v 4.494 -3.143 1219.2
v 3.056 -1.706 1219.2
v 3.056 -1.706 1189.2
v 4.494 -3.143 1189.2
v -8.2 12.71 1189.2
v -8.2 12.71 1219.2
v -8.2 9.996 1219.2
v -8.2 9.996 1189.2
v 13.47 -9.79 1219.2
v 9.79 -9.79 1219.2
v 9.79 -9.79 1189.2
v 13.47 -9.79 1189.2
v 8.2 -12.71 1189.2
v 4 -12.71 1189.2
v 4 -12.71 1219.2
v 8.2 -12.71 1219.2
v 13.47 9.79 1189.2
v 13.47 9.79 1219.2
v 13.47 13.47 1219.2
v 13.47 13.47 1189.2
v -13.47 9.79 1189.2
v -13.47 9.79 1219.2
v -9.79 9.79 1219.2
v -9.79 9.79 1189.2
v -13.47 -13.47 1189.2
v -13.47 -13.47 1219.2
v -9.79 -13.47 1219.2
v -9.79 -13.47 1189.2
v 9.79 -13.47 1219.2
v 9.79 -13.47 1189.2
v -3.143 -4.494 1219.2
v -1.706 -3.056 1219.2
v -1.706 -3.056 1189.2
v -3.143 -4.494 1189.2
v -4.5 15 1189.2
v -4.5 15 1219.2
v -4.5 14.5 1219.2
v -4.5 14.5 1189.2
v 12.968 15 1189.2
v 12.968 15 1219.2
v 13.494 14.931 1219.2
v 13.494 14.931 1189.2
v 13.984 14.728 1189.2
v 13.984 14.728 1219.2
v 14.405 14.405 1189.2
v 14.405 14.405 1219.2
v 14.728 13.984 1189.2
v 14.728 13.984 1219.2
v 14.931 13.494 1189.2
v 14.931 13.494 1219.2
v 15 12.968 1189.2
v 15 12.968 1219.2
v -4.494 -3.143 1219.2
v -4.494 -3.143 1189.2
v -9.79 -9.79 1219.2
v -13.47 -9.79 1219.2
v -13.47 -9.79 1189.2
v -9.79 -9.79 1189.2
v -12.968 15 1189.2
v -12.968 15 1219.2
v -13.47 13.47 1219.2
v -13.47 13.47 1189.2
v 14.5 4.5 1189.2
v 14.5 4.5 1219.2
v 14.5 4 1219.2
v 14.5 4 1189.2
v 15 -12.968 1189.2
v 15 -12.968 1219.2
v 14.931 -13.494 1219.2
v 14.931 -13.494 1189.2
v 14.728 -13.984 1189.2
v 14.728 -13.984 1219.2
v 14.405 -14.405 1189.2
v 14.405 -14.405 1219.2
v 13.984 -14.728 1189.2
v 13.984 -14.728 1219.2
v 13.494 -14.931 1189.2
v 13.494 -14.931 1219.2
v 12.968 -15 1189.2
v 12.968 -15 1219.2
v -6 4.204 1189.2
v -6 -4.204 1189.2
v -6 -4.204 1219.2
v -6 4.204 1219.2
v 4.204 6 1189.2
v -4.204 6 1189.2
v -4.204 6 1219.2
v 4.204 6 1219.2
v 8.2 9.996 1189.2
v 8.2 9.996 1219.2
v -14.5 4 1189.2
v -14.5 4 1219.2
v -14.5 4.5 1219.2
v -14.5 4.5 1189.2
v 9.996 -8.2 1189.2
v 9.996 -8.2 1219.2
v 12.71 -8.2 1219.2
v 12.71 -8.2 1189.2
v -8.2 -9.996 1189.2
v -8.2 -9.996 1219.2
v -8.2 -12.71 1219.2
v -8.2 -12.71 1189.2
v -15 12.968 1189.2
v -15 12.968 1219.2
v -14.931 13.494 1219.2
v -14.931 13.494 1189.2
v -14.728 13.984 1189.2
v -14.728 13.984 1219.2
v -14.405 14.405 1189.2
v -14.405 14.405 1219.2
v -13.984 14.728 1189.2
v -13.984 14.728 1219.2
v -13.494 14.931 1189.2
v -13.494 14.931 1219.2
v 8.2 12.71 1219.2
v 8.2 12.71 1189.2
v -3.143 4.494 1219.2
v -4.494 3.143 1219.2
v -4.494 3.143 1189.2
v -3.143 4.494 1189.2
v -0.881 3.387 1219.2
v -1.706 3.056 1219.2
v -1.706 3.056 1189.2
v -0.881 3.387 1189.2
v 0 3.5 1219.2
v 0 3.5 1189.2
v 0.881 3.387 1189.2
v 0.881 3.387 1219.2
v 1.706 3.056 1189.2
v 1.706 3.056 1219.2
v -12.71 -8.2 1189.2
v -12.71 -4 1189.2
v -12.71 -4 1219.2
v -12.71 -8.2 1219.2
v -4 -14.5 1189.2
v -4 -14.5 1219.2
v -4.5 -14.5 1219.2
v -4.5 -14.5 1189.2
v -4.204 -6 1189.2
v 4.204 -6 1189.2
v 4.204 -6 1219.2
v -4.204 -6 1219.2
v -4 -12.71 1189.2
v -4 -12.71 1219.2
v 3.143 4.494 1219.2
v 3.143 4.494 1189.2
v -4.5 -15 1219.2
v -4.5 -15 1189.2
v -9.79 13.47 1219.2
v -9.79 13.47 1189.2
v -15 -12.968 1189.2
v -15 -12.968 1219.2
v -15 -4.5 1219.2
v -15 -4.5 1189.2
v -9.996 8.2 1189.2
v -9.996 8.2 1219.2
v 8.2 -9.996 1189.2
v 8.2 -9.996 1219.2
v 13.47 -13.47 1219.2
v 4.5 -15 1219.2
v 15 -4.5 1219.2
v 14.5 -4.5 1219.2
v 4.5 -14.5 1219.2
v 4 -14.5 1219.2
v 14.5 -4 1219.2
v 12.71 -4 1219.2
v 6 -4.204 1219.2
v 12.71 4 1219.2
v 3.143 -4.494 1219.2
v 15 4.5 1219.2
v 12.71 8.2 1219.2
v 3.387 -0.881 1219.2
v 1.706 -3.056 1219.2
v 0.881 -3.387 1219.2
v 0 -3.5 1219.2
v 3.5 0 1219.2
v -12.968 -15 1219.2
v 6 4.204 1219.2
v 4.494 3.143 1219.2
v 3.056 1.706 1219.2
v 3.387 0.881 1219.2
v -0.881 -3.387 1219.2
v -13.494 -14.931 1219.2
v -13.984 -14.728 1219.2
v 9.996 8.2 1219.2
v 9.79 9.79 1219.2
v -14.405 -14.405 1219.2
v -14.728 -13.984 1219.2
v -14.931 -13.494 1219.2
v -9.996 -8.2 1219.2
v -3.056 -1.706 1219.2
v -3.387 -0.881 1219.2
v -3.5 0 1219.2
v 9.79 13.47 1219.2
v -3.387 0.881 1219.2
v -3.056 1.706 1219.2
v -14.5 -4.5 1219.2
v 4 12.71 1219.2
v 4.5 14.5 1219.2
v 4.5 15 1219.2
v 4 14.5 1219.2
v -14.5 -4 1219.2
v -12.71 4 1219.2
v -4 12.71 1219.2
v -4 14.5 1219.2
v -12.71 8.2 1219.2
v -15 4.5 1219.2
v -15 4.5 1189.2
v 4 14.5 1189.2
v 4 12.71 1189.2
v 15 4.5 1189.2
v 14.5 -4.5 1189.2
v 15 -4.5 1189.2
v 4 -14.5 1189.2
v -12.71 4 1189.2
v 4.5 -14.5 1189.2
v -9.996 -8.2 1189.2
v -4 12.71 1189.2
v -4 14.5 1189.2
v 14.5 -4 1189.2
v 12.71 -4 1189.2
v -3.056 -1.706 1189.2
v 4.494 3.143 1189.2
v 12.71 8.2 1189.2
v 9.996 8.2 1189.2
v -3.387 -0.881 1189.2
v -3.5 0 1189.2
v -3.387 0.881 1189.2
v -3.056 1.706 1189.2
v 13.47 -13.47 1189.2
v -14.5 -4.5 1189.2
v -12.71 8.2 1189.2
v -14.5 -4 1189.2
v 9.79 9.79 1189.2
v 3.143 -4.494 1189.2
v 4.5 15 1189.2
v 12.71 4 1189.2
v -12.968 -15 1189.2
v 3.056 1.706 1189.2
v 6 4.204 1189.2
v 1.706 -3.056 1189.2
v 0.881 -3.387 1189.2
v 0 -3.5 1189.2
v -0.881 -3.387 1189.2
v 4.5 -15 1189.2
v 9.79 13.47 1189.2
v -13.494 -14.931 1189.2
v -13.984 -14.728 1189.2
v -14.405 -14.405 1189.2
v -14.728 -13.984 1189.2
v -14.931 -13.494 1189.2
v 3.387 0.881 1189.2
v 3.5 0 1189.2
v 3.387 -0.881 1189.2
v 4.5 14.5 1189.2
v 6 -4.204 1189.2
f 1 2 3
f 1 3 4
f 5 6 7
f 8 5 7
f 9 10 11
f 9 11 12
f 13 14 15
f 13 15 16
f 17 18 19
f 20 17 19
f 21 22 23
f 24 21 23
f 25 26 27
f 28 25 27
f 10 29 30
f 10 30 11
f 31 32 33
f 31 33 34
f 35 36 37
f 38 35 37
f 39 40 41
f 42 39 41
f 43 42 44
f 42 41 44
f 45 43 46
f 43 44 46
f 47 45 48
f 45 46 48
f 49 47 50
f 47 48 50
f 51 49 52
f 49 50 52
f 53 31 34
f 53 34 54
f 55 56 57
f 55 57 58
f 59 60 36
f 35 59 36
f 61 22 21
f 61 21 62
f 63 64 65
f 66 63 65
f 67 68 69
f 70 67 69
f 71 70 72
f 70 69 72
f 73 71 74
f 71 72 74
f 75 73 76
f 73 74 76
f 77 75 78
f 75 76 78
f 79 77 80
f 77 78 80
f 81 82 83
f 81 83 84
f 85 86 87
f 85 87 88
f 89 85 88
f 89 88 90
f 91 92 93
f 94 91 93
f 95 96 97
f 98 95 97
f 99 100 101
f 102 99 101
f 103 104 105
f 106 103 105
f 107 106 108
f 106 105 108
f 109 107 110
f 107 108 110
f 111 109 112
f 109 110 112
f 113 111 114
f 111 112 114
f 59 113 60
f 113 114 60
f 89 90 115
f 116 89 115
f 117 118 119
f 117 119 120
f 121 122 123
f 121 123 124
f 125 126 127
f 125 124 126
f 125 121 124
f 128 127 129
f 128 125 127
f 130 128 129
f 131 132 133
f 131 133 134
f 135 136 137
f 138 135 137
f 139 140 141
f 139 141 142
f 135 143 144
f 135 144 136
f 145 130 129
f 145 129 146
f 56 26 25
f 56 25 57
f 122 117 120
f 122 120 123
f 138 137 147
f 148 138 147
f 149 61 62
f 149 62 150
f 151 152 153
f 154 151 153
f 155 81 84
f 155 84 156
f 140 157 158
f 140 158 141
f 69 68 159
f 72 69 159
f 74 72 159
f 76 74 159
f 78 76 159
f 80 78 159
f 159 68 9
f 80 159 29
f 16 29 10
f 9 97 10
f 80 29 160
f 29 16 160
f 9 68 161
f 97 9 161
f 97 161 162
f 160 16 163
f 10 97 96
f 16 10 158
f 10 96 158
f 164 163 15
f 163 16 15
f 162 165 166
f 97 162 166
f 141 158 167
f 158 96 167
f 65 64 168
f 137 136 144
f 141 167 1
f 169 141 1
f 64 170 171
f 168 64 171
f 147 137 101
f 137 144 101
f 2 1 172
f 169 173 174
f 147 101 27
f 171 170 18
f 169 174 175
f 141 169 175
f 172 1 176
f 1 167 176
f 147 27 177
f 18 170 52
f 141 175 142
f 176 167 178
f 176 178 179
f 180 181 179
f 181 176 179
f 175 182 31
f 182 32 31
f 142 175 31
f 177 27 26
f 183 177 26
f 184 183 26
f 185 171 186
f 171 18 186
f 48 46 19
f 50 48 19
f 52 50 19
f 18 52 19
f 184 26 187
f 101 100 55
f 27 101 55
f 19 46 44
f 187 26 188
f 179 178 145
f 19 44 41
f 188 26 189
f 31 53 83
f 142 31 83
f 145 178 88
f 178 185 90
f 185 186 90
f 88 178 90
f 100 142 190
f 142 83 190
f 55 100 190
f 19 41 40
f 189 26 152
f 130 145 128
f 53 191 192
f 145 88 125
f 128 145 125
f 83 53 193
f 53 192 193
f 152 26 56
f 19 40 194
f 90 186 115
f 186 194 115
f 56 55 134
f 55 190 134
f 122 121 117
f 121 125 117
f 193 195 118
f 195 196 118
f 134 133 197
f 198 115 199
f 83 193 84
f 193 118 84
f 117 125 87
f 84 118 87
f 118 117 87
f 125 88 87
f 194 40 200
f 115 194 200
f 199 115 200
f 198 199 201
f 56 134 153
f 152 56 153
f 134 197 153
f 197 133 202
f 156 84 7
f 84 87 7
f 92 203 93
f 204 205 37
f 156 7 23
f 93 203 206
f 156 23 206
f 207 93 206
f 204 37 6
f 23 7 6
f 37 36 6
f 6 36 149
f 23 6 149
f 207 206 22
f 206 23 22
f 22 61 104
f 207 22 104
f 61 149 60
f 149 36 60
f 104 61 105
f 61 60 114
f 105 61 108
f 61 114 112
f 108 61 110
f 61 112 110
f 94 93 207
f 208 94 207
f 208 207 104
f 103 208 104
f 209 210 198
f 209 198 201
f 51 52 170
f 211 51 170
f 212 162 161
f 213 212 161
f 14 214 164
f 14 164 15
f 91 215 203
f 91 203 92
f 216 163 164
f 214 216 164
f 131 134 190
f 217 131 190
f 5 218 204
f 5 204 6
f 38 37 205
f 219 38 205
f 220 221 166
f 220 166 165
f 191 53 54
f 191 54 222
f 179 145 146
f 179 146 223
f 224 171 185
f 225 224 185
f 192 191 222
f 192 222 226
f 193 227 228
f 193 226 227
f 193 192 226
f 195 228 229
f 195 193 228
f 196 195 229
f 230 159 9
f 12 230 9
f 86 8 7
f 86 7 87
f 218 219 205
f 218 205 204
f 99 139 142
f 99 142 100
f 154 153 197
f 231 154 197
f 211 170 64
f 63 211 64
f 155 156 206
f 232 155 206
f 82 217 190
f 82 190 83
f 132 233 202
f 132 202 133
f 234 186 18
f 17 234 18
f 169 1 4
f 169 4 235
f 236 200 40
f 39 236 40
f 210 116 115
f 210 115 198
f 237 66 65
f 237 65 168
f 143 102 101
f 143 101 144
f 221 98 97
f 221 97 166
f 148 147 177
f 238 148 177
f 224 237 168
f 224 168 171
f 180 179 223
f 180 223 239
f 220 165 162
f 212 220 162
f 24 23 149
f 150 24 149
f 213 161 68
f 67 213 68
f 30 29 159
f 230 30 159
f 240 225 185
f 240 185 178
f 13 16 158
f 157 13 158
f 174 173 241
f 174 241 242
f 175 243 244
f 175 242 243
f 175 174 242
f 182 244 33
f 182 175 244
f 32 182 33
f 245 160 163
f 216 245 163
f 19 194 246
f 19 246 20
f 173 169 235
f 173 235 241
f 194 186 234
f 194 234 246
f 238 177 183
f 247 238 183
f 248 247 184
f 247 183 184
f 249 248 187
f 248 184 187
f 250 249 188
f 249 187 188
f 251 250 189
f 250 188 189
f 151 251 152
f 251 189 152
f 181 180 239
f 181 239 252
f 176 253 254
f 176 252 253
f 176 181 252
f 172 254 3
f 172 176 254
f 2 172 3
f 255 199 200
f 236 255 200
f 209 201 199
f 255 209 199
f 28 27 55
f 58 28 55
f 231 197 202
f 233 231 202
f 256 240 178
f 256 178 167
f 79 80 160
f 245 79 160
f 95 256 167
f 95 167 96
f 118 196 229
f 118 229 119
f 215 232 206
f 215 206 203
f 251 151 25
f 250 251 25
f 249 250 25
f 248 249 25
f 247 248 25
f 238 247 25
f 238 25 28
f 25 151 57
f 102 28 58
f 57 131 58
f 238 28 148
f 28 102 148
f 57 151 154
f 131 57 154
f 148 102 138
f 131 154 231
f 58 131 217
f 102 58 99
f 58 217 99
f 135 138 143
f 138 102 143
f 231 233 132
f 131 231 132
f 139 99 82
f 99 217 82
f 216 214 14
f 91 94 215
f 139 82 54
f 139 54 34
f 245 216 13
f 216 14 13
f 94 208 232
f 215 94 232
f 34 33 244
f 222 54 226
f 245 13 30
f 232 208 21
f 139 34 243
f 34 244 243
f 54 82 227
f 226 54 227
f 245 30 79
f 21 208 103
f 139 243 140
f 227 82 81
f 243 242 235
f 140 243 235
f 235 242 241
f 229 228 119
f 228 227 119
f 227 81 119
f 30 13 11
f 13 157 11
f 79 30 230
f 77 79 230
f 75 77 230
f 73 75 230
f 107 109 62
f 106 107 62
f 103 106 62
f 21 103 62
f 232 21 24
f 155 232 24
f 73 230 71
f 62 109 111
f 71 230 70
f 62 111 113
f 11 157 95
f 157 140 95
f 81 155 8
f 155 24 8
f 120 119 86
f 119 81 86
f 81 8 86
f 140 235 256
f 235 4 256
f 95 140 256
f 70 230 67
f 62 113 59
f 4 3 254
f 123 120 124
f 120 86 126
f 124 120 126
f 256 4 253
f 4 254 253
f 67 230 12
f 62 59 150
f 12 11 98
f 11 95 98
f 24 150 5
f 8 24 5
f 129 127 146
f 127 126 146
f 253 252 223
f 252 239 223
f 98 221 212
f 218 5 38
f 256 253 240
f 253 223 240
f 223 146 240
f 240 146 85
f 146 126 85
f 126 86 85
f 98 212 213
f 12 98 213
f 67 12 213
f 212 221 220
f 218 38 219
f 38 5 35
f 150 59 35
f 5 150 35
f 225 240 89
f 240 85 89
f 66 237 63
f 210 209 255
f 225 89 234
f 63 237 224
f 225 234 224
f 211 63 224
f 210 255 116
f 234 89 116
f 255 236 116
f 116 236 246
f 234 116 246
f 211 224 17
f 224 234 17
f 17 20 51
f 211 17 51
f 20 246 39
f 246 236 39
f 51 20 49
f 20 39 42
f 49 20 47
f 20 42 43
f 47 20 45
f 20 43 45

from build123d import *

# Parameters (mm, degrees)
SKETCH3_W           = 3.68
SKETCH3_H           = 3.68
BOSS_EXTRUDE1_DEPTH = 1219.2
SKETCH4_W           = 30
SKETCH4_H           = 2408.4
CUT_EXTRUDE1_DEPTH  = 1220.661280848


with BuildPart() as part:
    # Sketch3 → Boss-Extrude1 (new, symmetric)
    with BuildSketch(Plane.XY):
        with BuildLine():
            Line((-4.203948776, 6), (0, 6))
            Line((0, 6), (4.203948776, 6))
            Line((4.203948776, 6), (8.2, 9.996051224))
            Line((8.2, 9.996051224), (8.2, 12.71))
            Line((8.2, 12.71), (4, 12.71))
            Line((4, 12.71), (4, 14.5))
            Line((4, 14.5), (4.5, 14.5))
            Line((4.5, 14.5), (4.5, 15))
            Line((4.5, 15), (12.968, 15))
            ThreePointArc((12.968, 15), (14.404840979, 14.404840979), (15, 12.968))
            Line((15, 12.968), (15, 4.5))
            Line((15, 4.5), (14.5, 4.5))
            Line((14.5, 4.5), (14.5, 4))
            Line((14.5, 4), (12.71, 4))
            Line((12.71, 4), (12.71, 8.2))
            Line((12.71, 8.2), (9.996051224, 8.2))
            Line((9.996051224, 8.2), (6, 4.203948776))
            Line((6, 4.203948776), (6, 0))
            Line((6, 0), (6, -4.203948776))
            Line((6, -4.203948776), (9.996051224, -8.2))
            Line((9.996051224, -8.2), (12.71, -8.2))
            Line((12.71, -8.2), (12.71, -4))
            Line((12.71, -4), (14.5, -4))
            Line((14.5, -4), (14.5, -4.5))
            Line((14.5, -4.5), (15, -4.5))
            Line((15, -4.5), (15, -12.968))
            ThreePointArc((15, -12.968), (14.404840979, -14.404840979), (12.968, -15))
            Line((12.968, -15), (4.5, -15))
            Line((4.5, -15), (4.5, -14.5))
            Line((4.5, -14.5), (4, -14.5))
            Line((4, -14.5), (4, -12.71))
            Line((4, -12.71), (8.2, -12.71))
            Line((8.2, -12.71), (8.2, -9.996051224))
            Line((8.2, -9.996051224), (4.203948776, -6))
            Line((4.203948776, -6), (0, -6))
            Line((0, -6), (-4.203948776, -6))
            Line((-4.203948776, -6), (-8.2, -9.996051224))
            Line((-8.2, -9.996051224), (-8.2, -12.71))
            Line((-8.2, -12.71), (-4, -12.71))
            Line((-4, -12.71), (-4, -14.5))
            Line((-4, -14.5), (-4.5, -14.5))
            Line((-4.5, -14.5), (-4.5, -15))
            Line((-4.5, -15), (-12.968, -15))
            ThreePointArc((-12.968, -15), (-14.404840979, -14.404840979), (-15, -12.968))
            Line((-15, -12.968), (-15, -4.5))
            Line((-15, -4.5), (-14.5, -4.5))
            Line((-14.5, -4.5), (-14.5, -4))
            Line((-14.5, -4), (-12.71, -4))
            Line((-12.71, -4), (-12.71, -8.2))
            Line((-12.71, -8.2), (-9.996051224, -8.2))
            Line((-9.996051224, -8.2), (-6, -4.203948776))
            Line((-6, -4.203948776), (-6, 0))
            Line((-6, 0), (-6, 4.203948776))
            Line((-6, 4.203948776), (-9.996051224, 8.2))
            Line((-9.996051224, 8.2), (-12.71, 8.2))
            Line((-12.71, 8.2), (-12.71, 4))
            Line((-12.71, 4), (-14.5, 4))
            Line((-14.5, 4), (-14.5, 4.5))
            Line((-14.5, 4.5), (-15, 4.5))
            Line((-15, 4.5), (-15, 12.968))
            ThreePointArc((-15, 12.968), (-14.404840979, 14.404840979), (-12.968, 15))
            Line((-12.968, 15), (-4.5, 15))
            Line((-4.5, 15), (-4.5, 14.5))
            Line((-4.5, 14.5), (-4, 14.5))
            Line((-4, 14.5), (-4, 12.71))
            Line((-4, 12.71), (-8.2, 12.71))
            Line((-8.2, 12.71), (-8.2, 9.996051224))
            Line((-8.2, 9.996051224), (-4.203948776, 6))
        make_face()
        with Locations((-11.63, 11.63)):
            Rectangle(SKETCH3_W, SKETCH3_H, mode=Mode.SUBTRACT)
        with BuildLine():
            Line((-3.143089642, 4.493663594), (-1.705676589, 3.056250541))
            ThreePointArc((-1.705676589, 3.056250541), (0, 3.5), (1.705676589, 3.056250541))
            Line((1.705676589, 3.056250541), (3.143089642, 4.493663594))
            Line((3.143089642, 4.493663594), (4.493663594, 3.143089642))
            Line((4.493663594, 3.143089642), (3.056250541, 1.705676589))
            ThreePointArc((3.056250541, 1.705676589), (3.5, 0), (3.056250541, -1.705676589))
            Line((3.056250541, -1.705676589), (4.493663594, -3.143089642))
            Line((4.493663594, -3.143089642), (3.143089642, -4.493663594))
            Line((3.143089642, -4.493663594), (1.705676589, -3.056250541))
            ThreePointArc((1.705676589, -3.056250541), (0, -3.5), (-1.705676589, -3.056250541))
            Line((-1.705676589, -3.056250541), (-3.143089642, -4.493663594))
            Line((-3.143089642, -4.493663594), (-4.493663594, -3.143089642))
            Line((-4.493663594, -3.143089642), (-3.056250541, -1.705676589))
            ThreePointArc((-3.056250541, -1.705676589), (-3.5, 0), (-3.056250541, 1.705676589))
            Line((-3.056250541, 1.705676589), (-4.493663594, 3.143089642))
            Line((-4.493663594, 3.143089642), (-3.143089642, 4.493663594))
        make_face(mode=Mode.SUBTRACT)
        with Locations((11.63, 11.63)):
            Rectangle(SKETCH3_W, SKETCH3_H, mode=Mode.SUBTRACT)
        with Locations((11.63, -11.63)):
            Rectangle(SKETCH3_W, SKETCH3_H, mode=Mode.SUBTRACT)
        with Locations((-11.63, -11.63)):
            Rectangle(SKETCH3_W, SKETCH3_H, mode=Mode.SUBTRACT)
    extrude(amount=BOSS_EXTRUDE1_DEPTH, both=True)

    # Sketch4 → Cut-Extrude1 (cut, through all)
    with BuildSketch(Plane(origin=(0, 15, 0), x_dir=(1, 0, 0), z_dir=(0, 1, 0))):
        with Locations((0, 15)):
            Rectangle(SKETCH4_W, SKETCH4_H)
    extrude(amount=-CUT_EXTRUDE1_DEPTH, mode=Mode.SUBTRACT)


solid = part.part
